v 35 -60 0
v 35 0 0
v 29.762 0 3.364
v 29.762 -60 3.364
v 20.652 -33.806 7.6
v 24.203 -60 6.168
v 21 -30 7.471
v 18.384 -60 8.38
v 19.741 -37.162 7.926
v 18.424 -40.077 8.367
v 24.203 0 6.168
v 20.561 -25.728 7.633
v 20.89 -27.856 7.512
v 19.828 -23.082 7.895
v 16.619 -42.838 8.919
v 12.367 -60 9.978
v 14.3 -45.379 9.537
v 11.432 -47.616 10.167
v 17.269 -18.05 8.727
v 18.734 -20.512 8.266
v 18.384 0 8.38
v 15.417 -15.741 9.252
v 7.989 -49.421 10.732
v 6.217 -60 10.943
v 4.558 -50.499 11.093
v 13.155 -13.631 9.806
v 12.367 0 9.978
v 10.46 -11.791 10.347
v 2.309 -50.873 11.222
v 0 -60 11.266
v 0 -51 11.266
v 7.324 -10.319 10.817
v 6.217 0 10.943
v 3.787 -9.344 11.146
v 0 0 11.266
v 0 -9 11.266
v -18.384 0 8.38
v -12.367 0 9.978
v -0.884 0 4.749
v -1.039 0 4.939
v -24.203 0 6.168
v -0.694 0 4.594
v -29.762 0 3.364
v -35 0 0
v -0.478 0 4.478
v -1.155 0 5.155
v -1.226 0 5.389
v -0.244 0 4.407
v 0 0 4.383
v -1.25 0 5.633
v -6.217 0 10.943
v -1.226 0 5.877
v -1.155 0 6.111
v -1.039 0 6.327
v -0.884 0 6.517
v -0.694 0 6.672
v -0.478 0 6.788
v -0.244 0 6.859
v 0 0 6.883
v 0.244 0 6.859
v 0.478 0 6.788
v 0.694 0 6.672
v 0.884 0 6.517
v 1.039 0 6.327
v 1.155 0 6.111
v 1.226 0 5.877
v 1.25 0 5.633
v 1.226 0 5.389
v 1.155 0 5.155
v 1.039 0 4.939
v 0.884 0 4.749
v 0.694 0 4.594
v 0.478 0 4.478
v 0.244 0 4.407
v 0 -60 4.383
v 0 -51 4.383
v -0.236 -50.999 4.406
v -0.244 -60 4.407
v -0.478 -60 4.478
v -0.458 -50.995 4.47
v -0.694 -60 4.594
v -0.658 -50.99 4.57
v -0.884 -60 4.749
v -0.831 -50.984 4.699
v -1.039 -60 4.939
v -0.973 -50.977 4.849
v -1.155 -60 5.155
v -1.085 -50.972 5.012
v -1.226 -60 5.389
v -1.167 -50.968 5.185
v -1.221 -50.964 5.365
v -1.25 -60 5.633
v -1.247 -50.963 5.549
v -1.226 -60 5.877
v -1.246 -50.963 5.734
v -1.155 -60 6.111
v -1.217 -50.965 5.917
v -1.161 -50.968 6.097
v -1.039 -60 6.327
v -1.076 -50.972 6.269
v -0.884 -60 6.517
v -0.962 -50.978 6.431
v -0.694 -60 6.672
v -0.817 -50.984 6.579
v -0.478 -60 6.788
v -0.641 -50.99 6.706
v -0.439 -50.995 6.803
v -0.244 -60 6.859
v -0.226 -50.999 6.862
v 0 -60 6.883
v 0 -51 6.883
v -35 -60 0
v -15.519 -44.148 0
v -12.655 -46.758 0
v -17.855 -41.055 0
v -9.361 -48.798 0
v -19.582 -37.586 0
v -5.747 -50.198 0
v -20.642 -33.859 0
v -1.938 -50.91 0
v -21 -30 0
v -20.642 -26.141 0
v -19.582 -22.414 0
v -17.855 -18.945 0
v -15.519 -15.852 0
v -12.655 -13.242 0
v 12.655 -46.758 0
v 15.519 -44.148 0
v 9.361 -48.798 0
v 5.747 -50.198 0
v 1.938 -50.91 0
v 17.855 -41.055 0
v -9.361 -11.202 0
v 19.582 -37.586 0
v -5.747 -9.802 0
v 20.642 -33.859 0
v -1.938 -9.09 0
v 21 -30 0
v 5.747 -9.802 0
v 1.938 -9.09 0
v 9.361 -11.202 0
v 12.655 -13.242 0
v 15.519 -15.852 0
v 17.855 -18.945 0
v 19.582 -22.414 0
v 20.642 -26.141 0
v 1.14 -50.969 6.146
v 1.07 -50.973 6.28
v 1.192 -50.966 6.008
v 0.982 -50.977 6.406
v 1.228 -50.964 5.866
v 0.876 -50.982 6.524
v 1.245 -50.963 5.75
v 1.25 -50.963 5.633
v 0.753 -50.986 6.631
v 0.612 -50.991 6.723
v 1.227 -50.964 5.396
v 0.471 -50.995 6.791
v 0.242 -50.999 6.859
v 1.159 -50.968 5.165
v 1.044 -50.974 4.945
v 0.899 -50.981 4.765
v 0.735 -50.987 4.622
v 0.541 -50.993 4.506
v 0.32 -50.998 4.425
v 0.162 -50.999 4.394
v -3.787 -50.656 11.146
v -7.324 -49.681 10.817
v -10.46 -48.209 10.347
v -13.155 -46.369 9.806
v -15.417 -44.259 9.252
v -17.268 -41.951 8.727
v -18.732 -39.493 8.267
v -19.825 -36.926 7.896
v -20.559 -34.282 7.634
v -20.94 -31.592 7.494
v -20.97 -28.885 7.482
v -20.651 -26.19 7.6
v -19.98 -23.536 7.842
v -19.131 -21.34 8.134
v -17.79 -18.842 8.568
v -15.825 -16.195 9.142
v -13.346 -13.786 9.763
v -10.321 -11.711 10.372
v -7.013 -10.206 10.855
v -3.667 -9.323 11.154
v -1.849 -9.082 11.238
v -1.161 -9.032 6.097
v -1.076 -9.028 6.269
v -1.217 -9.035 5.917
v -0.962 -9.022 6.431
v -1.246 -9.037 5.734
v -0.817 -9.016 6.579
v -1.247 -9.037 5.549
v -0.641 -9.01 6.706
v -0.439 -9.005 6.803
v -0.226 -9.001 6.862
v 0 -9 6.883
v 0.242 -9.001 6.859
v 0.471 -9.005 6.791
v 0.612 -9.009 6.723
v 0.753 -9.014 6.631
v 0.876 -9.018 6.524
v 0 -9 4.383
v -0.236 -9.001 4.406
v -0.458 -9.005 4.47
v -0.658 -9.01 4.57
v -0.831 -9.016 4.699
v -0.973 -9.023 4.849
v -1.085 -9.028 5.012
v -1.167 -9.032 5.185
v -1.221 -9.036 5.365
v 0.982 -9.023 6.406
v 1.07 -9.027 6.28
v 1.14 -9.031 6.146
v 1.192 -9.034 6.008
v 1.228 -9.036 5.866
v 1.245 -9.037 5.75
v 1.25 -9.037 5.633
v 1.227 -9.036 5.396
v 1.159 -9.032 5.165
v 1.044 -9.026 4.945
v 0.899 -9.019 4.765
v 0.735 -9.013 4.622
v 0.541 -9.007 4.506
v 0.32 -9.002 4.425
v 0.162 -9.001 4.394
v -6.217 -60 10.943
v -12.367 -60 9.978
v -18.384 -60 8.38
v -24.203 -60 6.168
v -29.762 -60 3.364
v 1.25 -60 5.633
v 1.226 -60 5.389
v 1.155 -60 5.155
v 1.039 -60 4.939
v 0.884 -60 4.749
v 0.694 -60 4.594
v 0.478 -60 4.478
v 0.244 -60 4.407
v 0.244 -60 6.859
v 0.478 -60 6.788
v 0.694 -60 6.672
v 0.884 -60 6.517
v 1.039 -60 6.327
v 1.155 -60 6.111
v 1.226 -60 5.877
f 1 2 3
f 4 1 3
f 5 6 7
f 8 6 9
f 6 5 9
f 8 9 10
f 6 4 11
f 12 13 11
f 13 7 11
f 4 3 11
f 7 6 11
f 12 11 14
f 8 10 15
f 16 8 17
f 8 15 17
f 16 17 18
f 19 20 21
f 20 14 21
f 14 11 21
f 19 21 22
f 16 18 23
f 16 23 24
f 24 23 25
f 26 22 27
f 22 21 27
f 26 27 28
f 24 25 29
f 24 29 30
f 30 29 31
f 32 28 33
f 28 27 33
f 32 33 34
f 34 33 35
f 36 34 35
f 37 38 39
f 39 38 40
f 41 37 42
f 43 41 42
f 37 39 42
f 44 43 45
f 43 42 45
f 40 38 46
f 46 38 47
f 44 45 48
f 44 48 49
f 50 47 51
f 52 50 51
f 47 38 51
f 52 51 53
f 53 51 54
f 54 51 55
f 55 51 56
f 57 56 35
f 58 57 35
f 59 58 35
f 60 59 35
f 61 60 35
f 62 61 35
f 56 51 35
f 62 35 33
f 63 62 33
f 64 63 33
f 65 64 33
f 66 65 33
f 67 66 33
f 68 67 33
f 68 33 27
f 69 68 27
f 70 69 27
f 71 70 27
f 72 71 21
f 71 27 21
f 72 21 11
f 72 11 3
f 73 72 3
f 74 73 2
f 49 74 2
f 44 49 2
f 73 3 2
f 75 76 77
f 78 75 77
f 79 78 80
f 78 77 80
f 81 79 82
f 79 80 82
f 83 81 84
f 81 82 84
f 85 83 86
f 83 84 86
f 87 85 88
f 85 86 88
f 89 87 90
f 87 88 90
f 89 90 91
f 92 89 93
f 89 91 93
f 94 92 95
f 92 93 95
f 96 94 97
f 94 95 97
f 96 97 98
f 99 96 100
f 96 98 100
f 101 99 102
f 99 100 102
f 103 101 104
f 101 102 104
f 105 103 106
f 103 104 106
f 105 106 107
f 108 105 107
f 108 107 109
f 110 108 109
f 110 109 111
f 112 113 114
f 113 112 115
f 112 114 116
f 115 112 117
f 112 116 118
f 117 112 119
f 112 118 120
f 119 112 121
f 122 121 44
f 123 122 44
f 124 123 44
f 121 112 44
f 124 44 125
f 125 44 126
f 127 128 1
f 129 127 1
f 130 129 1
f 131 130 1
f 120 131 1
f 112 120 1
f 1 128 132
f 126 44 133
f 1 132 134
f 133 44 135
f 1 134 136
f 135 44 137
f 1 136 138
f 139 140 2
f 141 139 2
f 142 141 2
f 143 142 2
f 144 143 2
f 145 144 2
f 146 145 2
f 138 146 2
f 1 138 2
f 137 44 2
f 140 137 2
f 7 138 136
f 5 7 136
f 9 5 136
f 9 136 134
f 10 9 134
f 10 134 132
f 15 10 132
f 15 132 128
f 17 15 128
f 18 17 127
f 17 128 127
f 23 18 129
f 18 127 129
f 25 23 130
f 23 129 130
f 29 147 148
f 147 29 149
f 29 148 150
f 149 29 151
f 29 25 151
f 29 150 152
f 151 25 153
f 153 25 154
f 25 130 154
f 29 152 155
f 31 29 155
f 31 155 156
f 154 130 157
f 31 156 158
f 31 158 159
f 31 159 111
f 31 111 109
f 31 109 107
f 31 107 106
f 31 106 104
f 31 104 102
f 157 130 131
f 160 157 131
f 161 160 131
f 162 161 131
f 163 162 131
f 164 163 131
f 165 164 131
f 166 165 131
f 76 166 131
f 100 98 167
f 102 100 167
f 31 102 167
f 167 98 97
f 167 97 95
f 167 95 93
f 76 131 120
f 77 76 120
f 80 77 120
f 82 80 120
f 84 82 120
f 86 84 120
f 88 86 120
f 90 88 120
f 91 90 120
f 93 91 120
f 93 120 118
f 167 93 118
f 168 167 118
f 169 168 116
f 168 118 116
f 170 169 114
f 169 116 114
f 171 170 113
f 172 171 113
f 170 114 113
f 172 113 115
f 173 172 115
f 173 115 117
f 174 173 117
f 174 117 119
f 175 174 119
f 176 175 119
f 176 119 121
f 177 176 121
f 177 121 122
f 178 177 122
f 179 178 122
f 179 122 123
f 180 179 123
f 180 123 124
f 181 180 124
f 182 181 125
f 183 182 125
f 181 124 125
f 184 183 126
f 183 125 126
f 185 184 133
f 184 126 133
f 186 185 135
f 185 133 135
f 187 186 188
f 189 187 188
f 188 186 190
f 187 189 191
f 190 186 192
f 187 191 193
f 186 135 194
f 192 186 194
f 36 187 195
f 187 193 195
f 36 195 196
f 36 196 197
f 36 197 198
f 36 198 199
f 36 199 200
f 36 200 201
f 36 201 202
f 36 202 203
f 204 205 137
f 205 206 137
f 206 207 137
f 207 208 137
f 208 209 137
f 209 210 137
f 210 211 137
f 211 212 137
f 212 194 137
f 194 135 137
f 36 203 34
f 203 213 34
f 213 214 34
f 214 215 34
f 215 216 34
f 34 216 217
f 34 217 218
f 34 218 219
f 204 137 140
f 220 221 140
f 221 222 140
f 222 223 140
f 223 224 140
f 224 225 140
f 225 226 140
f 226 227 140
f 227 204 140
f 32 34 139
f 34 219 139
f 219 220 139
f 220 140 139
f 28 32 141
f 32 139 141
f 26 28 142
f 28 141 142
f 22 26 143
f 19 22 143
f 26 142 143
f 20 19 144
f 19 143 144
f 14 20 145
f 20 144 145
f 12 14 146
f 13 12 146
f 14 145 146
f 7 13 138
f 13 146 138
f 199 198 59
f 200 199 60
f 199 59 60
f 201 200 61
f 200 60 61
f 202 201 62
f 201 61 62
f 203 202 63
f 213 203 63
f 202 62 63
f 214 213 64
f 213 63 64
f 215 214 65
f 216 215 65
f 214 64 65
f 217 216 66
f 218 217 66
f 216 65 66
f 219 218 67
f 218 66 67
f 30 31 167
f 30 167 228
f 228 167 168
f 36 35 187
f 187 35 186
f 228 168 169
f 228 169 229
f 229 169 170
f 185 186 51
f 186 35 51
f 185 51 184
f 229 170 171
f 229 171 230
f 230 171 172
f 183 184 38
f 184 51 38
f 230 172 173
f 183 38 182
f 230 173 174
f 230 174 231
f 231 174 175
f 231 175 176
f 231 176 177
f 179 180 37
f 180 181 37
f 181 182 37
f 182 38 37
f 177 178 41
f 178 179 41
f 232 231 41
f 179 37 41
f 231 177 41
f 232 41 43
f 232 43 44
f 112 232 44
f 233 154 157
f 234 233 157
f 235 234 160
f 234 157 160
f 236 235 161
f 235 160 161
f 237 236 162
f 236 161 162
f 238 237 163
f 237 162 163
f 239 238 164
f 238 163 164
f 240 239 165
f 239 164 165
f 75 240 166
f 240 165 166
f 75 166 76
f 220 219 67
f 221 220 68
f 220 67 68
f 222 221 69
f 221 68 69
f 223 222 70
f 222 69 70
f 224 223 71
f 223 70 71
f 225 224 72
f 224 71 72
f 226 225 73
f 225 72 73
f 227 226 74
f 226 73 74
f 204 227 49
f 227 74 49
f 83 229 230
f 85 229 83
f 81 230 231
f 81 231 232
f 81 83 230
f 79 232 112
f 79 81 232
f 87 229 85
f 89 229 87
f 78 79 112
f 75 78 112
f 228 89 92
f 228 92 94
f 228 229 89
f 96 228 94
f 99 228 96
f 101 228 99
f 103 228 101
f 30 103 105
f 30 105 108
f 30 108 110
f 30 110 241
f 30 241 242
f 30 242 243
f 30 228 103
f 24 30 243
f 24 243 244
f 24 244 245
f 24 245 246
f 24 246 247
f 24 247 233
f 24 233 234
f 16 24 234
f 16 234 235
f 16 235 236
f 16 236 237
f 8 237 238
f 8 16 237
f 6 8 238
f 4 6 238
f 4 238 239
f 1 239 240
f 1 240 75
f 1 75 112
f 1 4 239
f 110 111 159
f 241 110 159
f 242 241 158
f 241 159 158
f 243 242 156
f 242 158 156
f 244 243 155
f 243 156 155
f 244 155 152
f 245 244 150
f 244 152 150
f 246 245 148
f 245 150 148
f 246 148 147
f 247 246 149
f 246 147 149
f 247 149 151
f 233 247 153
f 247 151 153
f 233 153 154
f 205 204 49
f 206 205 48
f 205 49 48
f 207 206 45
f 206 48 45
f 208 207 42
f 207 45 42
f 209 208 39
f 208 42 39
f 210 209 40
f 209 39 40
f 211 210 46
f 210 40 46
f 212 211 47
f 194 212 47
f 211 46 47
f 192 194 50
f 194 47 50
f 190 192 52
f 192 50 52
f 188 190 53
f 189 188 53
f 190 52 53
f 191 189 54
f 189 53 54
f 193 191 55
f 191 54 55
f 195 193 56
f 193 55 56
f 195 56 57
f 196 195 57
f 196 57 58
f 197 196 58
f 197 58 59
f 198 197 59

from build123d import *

# Parameters (mm, degrees)
F1_DEPTH = 60
F2_R     = 21
F3_DEPTH = 25


with BuildPart() as f1:
    # F0 (on Front) → F1 (new body)
    with BuildSketch(Plane.XZ):
        with BuildLine():
            ThreePointArc((0, 11.266028276), (-18.3842554453, 8.3801171833), (-35, 0))
            Line((-35, 0), (0, 0))
            Line((0, 0), (0, 4.383014138))
            ThreePointArc((0, 4.383014138), (-1.25, 5.633014138), (0, 6.883014138))
            Line((0, 6.883014138), (0, 11.266028276))
        make_face()
        with BuildLine():
            Line((0, 0), (35, 0))
            ThreePointArc((35, 0), (18.3842554453, 8.3801171833), (0, 11.266028276))
            Line((0, 11.266028276), (0, 6.883014138))
            ThreePointArc((0, 6.883014138), (0.8838834765, 6.5168976145), (1.25, 5.633014138))
            ThreePointArc((1.25, 5.633014138), (0.8838834765, 4.7491306615), (0, 4.383014138))
            Line((0, 4.383014138), (0, 0))
        make_face()
    extrude(amount=F1_DEPTH)

    # F2 (on face) → F3 (cut)
    with BuildSketch(Plane(origin=(0, 0, 0), x_dir=(1, 0, 0), z_dir=(0, 0, -1))):
        with Locations((0, 30)):
            Circle(F2_R)
    extrude(amount=-F3_DEPTH, mode=Mode.SUBTRACT)


solid = f1.part
